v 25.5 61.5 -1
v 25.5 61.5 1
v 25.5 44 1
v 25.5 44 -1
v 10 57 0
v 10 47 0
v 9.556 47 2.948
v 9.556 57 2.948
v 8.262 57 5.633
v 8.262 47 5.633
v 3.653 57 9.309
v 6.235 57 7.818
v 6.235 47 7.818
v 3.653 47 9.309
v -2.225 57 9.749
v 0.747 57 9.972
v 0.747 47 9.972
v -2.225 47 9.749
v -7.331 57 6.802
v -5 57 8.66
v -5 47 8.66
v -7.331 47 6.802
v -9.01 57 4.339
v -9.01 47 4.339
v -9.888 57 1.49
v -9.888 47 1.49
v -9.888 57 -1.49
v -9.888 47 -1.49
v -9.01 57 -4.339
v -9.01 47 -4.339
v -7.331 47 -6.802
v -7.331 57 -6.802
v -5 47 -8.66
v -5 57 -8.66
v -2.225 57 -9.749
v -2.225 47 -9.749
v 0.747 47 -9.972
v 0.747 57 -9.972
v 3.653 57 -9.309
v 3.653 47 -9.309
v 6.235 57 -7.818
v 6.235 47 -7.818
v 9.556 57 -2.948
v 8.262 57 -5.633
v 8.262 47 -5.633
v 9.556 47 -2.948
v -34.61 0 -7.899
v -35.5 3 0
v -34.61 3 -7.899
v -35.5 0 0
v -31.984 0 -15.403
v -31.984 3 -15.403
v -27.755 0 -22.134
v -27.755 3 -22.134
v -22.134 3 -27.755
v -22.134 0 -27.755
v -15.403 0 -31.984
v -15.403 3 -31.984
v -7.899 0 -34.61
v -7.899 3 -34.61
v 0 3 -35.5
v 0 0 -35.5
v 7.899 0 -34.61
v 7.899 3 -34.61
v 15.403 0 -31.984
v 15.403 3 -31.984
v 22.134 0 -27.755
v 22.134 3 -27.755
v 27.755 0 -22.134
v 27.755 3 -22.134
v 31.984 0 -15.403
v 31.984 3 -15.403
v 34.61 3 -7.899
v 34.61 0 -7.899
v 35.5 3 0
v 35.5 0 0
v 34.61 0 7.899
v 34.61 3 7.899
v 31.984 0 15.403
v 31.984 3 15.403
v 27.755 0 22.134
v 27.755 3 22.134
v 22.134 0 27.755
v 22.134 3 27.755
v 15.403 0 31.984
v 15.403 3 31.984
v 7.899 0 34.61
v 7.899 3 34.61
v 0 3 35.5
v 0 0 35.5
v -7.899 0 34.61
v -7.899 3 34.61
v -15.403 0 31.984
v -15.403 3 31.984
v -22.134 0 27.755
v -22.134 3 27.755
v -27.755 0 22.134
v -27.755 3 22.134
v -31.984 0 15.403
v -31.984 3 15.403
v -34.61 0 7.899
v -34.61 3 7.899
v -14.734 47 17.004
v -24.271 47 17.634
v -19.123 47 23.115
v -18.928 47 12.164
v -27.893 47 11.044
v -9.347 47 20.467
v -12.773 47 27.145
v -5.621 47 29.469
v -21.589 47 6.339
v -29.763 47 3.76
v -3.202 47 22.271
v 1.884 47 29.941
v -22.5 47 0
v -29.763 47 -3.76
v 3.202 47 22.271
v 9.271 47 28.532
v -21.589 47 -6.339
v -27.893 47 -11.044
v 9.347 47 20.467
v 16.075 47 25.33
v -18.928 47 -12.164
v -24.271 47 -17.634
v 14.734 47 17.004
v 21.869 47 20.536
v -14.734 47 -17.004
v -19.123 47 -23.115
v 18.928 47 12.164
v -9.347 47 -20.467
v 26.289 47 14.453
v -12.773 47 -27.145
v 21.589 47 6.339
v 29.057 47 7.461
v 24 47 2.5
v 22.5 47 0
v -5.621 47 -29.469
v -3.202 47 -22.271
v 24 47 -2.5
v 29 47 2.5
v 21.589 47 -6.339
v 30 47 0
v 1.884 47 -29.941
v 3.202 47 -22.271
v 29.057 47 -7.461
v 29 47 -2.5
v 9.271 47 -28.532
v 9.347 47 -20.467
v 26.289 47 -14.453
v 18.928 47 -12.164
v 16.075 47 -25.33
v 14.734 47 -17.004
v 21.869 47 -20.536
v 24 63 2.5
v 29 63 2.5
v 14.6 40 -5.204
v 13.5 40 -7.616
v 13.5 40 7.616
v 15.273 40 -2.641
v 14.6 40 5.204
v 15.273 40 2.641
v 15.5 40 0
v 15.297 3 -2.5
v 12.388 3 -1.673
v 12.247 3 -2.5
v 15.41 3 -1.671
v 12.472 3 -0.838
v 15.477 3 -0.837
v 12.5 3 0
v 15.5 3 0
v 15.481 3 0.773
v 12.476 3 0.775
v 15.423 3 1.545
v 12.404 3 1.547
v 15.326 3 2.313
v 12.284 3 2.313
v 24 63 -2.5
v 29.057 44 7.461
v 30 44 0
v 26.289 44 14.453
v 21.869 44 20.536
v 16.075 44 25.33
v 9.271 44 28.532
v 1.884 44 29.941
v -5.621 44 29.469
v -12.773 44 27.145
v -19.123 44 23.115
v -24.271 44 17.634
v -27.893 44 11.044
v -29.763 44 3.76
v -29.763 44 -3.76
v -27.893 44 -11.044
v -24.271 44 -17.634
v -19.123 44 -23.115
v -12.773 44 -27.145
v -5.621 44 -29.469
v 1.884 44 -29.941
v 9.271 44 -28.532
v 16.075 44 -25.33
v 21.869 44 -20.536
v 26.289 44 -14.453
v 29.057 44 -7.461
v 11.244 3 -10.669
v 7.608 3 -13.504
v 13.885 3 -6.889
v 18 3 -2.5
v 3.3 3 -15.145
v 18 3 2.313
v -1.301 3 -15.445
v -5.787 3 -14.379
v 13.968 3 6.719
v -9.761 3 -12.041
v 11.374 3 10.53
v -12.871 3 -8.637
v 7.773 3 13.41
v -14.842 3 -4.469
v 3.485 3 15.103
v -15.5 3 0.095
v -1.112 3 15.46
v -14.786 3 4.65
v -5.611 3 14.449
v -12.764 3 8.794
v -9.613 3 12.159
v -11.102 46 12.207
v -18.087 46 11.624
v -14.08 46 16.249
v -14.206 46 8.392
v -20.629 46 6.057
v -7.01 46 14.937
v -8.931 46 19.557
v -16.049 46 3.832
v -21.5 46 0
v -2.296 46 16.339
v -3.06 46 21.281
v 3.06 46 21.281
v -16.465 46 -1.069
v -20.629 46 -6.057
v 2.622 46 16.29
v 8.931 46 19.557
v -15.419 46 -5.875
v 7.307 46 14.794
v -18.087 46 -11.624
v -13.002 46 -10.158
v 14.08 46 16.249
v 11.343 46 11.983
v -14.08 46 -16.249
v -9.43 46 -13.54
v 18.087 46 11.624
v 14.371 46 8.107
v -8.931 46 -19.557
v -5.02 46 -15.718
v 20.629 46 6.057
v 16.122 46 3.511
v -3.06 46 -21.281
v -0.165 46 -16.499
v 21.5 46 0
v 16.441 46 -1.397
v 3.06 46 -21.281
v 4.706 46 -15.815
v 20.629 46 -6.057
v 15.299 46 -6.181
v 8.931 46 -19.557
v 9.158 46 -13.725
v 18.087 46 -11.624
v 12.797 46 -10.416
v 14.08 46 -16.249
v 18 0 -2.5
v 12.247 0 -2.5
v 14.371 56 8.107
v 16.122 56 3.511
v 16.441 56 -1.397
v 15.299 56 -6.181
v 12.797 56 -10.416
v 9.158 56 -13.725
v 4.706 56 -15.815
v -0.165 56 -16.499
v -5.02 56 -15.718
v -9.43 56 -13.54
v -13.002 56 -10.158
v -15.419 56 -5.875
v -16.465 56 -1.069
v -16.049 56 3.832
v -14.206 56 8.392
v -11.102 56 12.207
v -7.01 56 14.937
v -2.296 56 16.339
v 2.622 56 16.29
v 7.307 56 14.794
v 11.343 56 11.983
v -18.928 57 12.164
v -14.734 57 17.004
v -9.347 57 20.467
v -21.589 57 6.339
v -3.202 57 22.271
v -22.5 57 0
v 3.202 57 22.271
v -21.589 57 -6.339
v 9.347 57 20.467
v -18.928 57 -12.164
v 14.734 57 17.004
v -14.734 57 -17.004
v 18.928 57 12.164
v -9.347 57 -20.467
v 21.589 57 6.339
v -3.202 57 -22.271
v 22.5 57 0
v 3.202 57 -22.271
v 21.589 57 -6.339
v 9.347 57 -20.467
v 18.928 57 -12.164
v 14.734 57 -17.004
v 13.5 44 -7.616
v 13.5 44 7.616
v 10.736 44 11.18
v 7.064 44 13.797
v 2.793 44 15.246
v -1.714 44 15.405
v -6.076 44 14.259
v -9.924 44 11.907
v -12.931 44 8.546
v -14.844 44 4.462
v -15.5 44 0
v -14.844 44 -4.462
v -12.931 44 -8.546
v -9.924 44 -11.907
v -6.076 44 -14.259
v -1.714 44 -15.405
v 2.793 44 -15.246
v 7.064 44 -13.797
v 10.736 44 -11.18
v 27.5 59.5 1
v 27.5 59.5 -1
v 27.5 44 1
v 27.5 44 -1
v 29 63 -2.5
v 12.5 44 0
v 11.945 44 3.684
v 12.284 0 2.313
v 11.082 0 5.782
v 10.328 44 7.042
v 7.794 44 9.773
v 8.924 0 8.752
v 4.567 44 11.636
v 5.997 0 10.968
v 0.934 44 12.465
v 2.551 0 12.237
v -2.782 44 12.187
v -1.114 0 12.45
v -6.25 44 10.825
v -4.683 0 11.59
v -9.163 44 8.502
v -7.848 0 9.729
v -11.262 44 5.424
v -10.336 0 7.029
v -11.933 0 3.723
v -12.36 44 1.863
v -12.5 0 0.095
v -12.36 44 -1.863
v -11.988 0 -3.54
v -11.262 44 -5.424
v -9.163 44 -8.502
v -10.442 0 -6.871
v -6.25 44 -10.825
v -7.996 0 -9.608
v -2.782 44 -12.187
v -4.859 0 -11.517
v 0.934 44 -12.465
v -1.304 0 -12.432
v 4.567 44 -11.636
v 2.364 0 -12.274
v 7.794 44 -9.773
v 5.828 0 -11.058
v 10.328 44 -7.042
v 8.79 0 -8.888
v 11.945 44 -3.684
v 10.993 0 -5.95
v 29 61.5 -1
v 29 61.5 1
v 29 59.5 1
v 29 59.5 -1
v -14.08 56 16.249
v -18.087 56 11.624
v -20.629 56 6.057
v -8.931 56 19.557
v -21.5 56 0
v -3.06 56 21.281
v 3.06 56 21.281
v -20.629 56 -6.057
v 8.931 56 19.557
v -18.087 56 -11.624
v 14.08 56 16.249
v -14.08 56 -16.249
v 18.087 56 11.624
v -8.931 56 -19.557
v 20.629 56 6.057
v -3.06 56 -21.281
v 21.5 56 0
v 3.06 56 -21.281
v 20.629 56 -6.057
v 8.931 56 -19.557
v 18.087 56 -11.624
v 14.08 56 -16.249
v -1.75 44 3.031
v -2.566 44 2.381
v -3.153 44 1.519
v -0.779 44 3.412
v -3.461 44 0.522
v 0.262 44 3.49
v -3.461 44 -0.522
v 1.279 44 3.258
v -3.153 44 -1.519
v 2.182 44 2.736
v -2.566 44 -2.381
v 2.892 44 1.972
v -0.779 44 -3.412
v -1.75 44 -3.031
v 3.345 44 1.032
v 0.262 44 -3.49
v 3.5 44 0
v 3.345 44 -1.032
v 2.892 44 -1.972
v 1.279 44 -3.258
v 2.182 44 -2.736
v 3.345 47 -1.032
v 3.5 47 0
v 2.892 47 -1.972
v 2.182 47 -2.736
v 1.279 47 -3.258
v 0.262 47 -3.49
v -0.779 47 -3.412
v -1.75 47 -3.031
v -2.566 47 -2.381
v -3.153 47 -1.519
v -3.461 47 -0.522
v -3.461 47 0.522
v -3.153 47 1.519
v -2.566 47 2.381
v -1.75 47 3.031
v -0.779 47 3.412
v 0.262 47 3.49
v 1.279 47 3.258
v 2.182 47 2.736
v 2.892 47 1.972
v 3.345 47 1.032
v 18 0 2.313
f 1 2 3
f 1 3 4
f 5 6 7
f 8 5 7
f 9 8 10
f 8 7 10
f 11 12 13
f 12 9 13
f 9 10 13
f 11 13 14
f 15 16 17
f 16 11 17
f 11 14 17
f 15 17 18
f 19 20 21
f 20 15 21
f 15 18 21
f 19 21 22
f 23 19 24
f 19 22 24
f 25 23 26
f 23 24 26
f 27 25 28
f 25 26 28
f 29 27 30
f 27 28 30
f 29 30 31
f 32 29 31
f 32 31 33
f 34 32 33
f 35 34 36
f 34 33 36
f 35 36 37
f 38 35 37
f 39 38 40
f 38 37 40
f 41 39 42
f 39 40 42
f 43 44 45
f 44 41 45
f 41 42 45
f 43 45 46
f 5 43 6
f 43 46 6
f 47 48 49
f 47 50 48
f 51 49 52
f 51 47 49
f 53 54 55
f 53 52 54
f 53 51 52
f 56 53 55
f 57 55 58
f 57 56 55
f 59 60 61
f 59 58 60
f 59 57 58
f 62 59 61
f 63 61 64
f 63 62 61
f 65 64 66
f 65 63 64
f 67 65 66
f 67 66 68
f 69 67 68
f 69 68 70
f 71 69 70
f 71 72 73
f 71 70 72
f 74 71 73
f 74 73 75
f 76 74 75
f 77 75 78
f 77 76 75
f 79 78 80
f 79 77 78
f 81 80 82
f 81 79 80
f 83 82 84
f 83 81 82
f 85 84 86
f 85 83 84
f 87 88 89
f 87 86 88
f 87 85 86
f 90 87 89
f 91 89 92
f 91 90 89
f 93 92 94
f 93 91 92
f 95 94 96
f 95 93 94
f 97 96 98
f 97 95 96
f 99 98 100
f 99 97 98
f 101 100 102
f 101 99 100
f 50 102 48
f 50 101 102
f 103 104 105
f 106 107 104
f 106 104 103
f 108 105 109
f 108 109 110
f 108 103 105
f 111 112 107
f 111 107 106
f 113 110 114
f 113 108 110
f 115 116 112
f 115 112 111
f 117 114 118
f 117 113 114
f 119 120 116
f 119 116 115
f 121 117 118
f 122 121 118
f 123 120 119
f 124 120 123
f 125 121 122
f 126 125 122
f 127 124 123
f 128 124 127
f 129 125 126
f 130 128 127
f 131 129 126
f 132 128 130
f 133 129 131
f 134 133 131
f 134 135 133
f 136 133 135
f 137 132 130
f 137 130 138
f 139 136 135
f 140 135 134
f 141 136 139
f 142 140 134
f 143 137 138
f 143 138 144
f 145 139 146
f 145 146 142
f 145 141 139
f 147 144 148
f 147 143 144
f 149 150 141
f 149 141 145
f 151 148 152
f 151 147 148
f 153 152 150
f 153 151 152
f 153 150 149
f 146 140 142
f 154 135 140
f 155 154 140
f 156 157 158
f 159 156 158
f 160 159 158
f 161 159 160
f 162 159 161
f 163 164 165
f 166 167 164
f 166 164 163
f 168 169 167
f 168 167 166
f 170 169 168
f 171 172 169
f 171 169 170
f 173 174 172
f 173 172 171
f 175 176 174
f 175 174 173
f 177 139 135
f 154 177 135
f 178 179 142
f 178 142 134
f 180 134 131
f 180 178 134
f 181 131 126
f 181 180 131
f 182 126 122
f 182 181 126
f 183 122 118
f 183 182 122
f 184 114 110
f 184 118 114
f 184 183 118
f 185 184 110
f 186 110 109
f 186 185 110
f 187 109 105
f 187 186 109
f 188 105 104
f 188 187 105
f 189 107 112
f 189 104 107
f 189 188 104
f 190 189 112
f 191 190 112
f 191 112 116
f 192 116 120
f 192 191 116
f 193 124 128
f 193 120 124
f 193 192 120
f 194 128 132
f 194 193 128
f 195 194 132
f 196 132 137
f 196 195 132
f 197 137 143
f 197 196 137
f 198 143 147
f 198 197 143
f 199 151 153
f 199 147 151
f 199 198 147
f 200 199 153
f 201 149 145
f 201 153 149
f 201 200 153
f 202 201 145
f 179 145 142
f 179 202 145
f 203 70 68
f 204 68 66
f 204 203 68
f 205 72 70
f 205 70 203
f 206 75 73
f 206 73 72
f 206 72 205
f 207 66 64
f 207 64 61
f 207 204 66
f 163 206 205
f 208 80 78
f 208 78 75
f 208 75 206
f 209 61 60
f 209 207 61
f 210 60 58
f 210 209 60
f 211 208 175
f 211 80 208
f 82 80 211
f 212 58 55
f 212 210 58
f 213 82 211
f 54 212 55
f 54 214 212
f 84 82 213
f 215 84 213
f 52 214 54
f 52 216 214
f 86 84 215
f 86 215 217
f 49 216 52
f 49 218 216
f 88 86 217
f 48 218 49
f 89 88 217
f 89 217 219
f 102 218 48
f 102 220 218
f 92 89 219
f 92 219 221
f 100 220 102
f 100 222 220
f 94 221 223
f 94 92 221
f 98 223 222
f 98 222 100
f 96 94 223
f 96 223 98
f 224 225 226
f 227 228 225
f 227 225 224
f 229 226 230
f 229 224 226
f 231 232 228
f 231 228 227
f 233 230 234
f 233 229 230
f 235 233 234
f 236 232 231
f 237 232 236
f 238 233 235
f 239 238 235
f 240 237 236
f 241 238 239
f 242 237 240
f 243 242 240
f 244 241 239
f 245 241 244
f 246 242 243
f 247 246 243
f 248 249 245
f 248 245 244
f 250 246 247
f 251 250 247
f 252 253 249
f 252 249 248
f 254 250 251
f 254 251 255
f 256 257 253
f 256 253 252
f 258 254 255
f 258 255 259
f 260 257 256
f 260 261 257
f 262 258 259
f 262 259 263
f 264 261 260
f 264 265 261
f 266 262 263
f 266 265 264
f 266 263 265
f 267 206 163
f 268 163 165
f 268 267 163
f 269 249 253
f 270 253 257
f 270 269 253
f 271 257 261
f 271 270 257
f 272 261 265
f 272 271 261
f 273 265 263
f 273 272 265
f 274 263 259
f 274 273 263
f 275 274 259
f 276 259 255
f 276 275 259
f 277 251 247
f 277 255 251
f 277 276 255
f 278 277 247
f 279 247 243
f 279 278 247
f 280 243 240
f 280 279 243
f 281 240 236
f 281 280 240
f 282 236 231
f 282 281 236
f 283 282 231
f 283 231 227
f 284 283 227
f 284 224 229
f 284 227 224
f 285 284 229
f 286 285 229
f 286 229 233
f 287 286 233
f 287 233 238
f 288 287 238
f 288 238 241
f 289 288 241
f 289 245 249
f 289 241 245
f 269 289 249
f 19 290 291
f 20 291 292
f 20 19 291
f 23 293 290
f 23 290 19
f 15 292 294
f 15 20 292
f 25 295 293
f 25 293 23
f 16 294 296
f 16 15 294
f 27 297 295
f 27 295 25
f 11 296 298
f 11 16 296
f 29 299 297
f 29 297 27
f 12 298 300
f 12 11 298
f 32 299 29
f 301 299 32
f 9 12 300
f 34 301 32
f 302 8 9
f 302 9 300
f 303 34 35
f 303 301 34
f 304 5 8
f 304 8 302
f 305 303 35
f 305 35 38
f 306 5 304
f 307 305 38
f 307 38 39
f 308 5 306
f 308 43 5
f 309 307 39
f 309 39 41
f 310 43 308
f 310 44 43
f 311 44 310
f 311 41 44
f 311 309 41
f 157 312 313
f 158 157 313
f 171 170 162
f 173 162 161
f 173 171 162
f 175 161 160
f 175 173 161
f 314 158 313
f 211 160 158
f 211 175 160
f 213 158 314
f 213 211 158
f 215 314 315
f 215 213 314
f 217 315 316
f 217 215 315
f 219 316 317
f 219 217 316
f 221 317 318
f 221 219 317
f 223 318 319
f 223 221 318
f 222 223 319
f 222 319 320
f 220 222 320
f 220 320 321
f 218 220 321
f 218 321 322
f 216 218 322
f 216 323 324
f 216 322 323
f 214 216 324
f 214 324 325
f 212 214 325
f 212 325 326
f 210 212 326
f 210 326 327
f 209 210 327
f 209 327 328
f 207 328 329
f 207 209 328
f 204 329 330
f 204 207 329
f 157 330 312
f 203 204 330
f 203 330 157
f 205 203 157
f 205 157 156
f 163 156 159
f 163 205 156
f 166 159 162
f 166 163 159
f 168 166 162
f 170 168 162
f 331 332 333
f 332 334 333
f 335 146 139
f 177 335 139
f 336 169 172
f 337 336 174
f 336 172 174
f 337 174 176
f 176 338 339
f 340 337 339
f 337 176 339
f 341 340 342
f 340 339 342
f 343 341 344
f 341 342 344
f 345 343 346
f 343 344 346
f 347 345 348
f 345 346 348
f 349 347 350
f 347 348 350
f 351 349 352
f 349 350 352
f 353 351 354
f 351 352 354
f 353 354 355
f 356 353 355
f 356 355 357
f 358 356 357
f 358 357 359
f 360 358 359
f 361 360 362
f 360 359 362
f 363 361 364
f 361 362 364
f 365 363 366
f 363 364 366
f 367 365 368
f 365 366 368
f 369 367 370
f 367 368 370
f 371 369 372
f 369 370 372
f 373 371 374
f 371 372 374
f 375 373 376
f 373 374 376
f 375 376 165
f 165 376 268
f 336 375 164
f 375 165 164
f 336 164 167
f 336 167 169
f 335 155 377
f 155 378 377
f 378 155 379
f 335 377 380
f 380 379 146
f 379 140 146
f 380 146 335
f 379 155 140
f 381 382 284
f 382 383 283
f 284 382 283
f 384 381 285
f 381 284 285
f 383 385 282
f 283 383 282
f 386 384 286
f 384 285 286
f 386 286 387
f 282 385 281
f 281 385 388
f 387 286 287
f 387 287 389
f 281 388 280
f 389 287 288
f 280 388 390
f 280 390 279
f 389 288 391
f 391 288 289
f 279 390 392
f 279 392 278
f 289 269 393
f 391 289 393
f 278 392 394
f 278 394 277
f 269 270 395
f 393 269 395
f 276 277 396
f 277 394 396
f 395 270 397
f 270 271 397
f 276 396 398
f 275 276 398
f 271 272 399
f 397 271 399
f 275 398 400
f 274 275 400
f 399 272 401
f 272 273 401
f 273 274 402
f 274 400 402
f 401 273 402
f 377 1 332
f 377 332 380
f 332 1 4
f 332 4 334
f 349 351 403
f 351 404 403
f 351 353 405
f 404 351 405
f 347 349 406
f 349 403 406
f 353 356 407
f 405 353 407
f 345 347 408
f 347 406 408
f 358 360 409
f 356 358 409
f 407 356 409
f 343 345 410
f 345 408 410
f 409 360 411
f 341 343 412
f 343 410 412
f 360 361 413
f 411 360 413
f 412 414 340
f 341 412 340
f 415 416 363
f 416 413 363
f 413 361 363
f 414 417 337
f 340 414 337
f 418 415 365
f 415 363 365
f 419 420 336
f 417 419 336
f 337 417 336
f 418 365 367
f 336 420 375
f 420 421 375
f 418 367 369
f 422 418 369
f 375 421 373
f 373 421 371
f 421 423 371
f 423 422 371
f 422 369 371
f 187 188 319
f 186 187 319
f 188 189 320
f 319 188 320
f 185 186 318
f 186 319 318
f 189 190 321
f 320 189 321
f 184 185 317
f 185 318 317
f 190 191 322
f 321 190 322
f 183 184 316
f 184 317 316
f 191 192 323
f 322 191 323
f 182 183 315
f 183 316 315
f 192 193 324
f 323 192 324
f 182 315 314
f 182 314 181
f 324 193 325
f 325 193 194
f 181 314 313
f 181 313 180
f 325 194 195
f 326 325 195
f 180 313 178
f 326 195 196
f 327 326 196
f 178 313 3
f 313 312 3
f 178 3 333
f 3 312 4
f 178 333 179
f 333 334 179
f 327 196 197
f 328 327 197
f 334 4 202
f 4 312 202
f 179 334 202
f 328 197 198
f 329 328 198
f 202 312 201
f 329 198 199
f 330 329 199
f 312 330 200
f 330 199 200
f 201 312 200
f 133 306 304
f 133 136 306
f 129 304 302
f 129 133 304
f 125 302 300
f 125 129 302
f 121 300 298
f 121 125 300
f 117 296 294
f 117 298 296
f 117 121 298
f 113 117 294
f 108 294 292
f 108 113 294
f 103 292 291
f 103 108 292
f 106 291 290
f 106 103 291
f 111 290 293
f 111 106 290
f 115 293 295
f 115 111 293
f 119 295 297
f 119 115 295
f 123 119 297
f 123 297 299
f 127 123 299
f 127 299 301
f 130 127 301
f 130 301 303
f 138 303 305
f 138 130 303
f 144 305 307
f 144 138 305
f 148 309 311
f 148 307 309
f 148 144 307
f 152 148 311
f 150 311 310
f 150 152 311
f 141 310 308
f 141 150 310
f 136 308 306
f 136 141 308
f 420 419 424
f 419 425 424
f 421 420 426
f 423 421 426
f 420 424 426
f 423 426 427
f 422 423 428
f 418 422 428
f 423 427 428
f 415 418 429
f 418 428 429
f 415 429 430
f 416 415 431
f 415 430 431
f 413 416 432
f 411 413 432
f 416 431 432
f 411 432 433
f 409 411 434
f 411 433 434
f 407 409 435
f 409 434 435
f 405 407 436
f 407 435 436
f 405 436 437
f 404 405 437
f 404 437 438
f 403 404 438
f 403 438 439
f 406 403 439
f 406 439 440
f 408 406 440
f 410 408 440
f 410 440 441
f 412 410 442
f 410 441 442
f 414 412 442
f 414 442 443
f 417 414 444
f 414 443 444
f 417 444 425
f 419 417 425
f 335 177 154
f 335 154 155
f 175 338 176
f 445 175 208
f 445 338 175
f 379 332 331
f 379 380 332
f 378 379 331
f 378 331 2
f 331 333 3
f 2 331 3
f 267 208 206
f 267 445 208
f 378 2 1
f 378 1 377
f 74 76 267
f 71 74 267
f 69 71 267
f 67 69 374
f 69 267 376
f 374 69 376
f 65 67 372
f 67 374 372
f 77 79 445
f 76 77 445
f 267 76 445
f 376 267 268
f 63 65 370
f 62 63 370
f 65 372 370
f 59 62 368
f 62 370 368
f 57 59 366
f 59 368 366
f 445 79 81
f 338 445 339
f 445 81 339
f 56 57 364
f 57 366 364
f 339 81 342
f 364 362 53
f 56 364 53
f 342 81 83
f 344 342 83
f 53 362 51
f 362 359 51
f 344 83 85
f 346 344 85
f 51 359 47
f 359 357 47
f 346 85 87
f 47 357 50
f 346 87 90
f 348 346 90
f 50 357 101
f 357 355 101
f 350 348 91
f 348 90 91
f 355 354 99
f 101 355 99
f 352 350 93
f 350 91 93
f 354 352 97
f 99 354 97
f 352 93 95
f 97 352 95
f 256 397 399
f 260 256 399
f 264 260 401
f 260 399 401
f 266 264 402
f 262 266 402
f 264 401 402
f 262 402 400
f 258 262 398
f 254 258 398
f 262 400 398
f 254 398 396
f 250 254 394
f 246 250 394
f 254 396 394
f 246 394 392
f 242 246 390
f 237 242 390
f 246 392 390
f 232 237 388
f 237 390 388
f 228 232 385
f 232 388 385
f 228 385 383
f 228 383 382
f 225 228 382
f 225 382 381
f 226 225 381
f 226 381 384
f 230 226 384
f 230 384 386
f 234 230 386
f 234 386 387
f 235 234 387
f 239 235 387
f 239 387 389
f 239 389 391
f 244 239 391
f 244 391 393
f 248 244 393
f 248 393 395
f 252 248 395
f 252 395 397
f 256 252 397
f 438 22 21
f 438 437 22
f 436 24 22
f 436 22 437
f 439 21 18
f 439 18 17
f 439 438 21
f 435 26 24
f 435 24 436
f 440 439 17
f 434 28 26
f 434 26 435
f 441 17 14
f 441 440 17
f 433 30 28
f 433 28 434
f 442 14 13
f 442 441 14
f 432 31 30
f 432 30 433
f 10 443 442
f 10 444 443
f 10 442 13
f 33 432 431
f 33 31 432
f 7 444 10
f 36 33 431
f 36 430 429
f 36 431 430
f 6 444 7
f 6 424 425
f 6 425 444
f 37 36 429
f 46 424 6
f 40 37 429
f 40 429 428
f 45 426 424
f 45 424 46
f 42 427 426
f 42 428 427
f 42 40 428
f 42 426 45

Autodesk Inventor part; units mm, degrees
ref_plane "YZ Plane" through (0, 0, 0) normal (1, 0, 0) x (0, 1, 0)
ref_plane "XZ Plane" through (0, 0, 0) normal (0, 1, 0) x (-1, 0, 0)
sketch "草图1" plane through (0, 0, 0) normal (0, 1, 0) x (-1, 0, 0)
  circle A0 centre (0, 0) radius 35.5
  dimension "d0" = 71
extrude "拉伸1" add sketch "草图1" along normal blind 3
sketch "草图2" plane through (0, 3, 0) normal (0, 1, 0) x (1, 0, 0)
  circle A0 centre (0, 0) radius 15.5
  circle A1 centre (0, 0) radius 12.5
  dimension "d3" = 31
  dimension "d4" = 25
extrude "拉伸2" add sketch "草图2" along normal blind 41
sketch "草图3" plane through (0, 44, 0) normal (0, 1, 0) x (1, 0, 0)
  circle A0 centre (0, 0) radius 30
  dimension "d7" = 60
extrude "拉伸3" add sketch "草图3" along normal blind 3
sketch "草图4" plane through (0, 0, 0) normal (0, -1, 0) x (1, 0, 0)
  circle A0 centre (0, 0) radius 12.5 projected
extrude "拉伸4" cut sketch "草图4" against normal blind 3
sketch "草图5" plane through (0, 47, 0) normal (0, 1, 0) x (1, 0, 0)
  circle A0 centre (0, 0) radius 12.5 projected
  circle A1 centre (0, 0) radius 3.5
  dimension "d12" = 7
extrude "拉伸5" cut sketch "草图5" against normal blind 5 contours A1
sketch "草图6" plane through (0, 47, 0) normal (0, 1, 0) x (1, 0, 0)
  circle A0 centre (0, 0) radius 10
  circle A1 centre (0, 0) radius 22.5
  dimension "d15" = 20
  dimension "d16" = 45
extrude "拉伸6" add sketch "草图6" along normal blind 10
sketch "草图7" plane through (0, 47, 0) normal (0, 1, 0) x (1, 0, 0)
  circle A0 centre (0, 0) radius 3.5 projected
  line L0 (3.5, 3.5) -> (48.5, 3.5)
  line L1 (48.5, 3.5) -> (48.5, -3.5)
  line L2 (48.5, -3.5) -> (3.5, -3.5)
  line L3 (3.5, -3.5) -> (3.5, 3.5)
  dimension "d19" = 45
  dimension "d20" = 7
extrude "拉伸7" [suppressed]
sketch "草图8" plane through (0, 47, 0) normal (0, 1, 0) x (1, 0, 0)
  circle A0 centre (44.1819, 0) radius 2.5
  point P0 (0, 0)
  dimension "d23" = 5
extrude "拉伸8" [suppressed]
pattern_circular "环形阵列1" [suppressed]
sketch "草图9" plane through (0, 47, 0) normal (0, 1, 0) x (1, 0, 0)
  line L0 (24, -2.5) -> (29, -2.5)
  line L1 (29, -2.5) -> (29, 2.5)
  line L2 (29, 2.5) -> (24, 2.5)
  line L3 (24, 2.5) -> (24, -2.5)
  line L4 (-49.7, 0) -> (49.7, 0) projected
  point P0 (0, 0)
  dimension "d32" = 5
  dimension "d33" = 5
  dimension "d34" = 24
extrude "拉伸9" add sketch "草图9" along normal blind 16
sketch "草图10" plane through (0, 44, 0) normal (0, -1, 0) x (1, 0, 0)
  line L0 (13.5, 10) -> (26.5, 10)
  line L1 (26.5, 10) -> (26.5, -12)
  line L2 (26.5, -12) -> (13.5, -12)
  line L3 (13.5, -12) -> (13.5, 10)
  point P0 (0, 0)
  dimension "d36" = 10
  dimension "d38" = 22
  dimension "d40" = 13
  dimension "d41" = 13.5
extrude "拉伸10" cut sketch "草图10" along normal blind 4
sketch "草图11" plane through (0, 44, 0) normal (0, -1, 0) x (1, 0, 0)
  circle A0 centre (0, 0) radius 12.5 projected
  line L0 (24, 2.5) -> (29, 2.5) projected
  line L1 (29, 2.5) -> (29, -2.5) projected
  line L2 (29, -2.5) -> (24, -2.5) projected
  line L3 (24, -2.5) -> (24, 2.5) projected
  line L4 (27.5, -1) -> (27.5, 1)
  line L5 (27.5, 1) -> (25.5, 1)
  line L6 (25.5, 1) -> (25.5, -1)
  line L7 (25.5, -1) -> (27.5, -1)
  dimension "d44" = 1.5
extrude "拉伸11" cut sketch "草图11" against normal blind 17.5 contours L7 L6 L5 L4
sketch "草图12" plane through (29, 47, 2.5) normal (1, 0, 0) x (0, 0, -1)
  line L0 (1.5, 14.5) -> (3.5, 14.5) projected
  line L1 (3.5, -3) -> (3.5, 14.5) projected
  line L2 (1.5, 14.5) -> (3.5, 14.5)
  line L3 (3.5, 14.5) -> (3.5, 12.5)
  line L4 (3.5, 12.5) -> (1.5, 12.5)
  line L5 (1.5, 12.5) -> (1.5, 14.5)
  point P0 (2.5, -47)
  dimension "d47" = 2
extrude "拉伸12" cut sketch "草图12" against normal blind 2
sketch "草图13" plane through (0, 0, 0) normal (0, -1, 0) x (1, 0, 0)
  line L0 (24, -2.5) -> (29, -2.5) projected
  line L1 (9, 2.3127) -> (18, 2.3127)
  line L2 (18, 2.3127) -> (18, -2.5)
  line L3 (18, -2.5) -> (9, -2.5)
  line L4 (9, -2.5) -> (9, 2.3127)
  point P0 (0, 0)
  dimension "d52" = 9
  dimension "d53" = 9
extrude "拉伸13" cut sketch "草图13" against normal blind 3
ref_plane "工作平面2" through (0, 56, 0) normal (0, 1, 0) x (1, 0, 0)
sketch "草图14" plane through (0, 57, 0) normal (0, 1, 0) x (1, 0, 0)
  circle A0 centre (0, 0) radius 10 projected
  circle A1 centre (0, 0) radius 22.5 projected
  arc A2 (13.5, -7.6158) -> (13.5, 7.6158) centre (0, 0) ccw projected
  arc A3 (13.5, 7.6158) -> (13.5, -7.6158) centre (0, 0) ccw projected
  circle A4 centre (0, 0) radius 21.5
  arc A5 (14.371, -8.1071) -> (14.371, 8.1071) centre (0, 0) ccw
  arc A6 (14.371, 8.1071) -> (14.371, -8.1071) centre (0, 0) ccw
  dimension "d56" = 1
sketch "草图15" plane through (0, 56, 0) normal (0, 1, 0) x (1, 0, 0)
  circle A0 centre (0, 0) radius 10
  circle A1 centre (0, 0) radius 22.5
  arc A2 (13.5, -7.6158) -> (13.5, 7.6158) centre (0, 0) ccw
  arc A3 (13.5, 7.6158) -> (13.5, -7.6158) centre (0, 0) ccw
  circle A4 centre (0, 0) radius 21.5
  arc A5 (14.371, -8.1071) -> (14.371, 8.1071) centre (0, 0) ccw
  arc A6 (14.371, 8.1071) -> (14.371, -8.1071) centre (0, 0) ccw
  dimension "d58" = 1
extrude "拉伸14" cut sketch "草图15" against normal blind 10 contours A4
properties part number "电机帽" material "尼龙 6/6"
